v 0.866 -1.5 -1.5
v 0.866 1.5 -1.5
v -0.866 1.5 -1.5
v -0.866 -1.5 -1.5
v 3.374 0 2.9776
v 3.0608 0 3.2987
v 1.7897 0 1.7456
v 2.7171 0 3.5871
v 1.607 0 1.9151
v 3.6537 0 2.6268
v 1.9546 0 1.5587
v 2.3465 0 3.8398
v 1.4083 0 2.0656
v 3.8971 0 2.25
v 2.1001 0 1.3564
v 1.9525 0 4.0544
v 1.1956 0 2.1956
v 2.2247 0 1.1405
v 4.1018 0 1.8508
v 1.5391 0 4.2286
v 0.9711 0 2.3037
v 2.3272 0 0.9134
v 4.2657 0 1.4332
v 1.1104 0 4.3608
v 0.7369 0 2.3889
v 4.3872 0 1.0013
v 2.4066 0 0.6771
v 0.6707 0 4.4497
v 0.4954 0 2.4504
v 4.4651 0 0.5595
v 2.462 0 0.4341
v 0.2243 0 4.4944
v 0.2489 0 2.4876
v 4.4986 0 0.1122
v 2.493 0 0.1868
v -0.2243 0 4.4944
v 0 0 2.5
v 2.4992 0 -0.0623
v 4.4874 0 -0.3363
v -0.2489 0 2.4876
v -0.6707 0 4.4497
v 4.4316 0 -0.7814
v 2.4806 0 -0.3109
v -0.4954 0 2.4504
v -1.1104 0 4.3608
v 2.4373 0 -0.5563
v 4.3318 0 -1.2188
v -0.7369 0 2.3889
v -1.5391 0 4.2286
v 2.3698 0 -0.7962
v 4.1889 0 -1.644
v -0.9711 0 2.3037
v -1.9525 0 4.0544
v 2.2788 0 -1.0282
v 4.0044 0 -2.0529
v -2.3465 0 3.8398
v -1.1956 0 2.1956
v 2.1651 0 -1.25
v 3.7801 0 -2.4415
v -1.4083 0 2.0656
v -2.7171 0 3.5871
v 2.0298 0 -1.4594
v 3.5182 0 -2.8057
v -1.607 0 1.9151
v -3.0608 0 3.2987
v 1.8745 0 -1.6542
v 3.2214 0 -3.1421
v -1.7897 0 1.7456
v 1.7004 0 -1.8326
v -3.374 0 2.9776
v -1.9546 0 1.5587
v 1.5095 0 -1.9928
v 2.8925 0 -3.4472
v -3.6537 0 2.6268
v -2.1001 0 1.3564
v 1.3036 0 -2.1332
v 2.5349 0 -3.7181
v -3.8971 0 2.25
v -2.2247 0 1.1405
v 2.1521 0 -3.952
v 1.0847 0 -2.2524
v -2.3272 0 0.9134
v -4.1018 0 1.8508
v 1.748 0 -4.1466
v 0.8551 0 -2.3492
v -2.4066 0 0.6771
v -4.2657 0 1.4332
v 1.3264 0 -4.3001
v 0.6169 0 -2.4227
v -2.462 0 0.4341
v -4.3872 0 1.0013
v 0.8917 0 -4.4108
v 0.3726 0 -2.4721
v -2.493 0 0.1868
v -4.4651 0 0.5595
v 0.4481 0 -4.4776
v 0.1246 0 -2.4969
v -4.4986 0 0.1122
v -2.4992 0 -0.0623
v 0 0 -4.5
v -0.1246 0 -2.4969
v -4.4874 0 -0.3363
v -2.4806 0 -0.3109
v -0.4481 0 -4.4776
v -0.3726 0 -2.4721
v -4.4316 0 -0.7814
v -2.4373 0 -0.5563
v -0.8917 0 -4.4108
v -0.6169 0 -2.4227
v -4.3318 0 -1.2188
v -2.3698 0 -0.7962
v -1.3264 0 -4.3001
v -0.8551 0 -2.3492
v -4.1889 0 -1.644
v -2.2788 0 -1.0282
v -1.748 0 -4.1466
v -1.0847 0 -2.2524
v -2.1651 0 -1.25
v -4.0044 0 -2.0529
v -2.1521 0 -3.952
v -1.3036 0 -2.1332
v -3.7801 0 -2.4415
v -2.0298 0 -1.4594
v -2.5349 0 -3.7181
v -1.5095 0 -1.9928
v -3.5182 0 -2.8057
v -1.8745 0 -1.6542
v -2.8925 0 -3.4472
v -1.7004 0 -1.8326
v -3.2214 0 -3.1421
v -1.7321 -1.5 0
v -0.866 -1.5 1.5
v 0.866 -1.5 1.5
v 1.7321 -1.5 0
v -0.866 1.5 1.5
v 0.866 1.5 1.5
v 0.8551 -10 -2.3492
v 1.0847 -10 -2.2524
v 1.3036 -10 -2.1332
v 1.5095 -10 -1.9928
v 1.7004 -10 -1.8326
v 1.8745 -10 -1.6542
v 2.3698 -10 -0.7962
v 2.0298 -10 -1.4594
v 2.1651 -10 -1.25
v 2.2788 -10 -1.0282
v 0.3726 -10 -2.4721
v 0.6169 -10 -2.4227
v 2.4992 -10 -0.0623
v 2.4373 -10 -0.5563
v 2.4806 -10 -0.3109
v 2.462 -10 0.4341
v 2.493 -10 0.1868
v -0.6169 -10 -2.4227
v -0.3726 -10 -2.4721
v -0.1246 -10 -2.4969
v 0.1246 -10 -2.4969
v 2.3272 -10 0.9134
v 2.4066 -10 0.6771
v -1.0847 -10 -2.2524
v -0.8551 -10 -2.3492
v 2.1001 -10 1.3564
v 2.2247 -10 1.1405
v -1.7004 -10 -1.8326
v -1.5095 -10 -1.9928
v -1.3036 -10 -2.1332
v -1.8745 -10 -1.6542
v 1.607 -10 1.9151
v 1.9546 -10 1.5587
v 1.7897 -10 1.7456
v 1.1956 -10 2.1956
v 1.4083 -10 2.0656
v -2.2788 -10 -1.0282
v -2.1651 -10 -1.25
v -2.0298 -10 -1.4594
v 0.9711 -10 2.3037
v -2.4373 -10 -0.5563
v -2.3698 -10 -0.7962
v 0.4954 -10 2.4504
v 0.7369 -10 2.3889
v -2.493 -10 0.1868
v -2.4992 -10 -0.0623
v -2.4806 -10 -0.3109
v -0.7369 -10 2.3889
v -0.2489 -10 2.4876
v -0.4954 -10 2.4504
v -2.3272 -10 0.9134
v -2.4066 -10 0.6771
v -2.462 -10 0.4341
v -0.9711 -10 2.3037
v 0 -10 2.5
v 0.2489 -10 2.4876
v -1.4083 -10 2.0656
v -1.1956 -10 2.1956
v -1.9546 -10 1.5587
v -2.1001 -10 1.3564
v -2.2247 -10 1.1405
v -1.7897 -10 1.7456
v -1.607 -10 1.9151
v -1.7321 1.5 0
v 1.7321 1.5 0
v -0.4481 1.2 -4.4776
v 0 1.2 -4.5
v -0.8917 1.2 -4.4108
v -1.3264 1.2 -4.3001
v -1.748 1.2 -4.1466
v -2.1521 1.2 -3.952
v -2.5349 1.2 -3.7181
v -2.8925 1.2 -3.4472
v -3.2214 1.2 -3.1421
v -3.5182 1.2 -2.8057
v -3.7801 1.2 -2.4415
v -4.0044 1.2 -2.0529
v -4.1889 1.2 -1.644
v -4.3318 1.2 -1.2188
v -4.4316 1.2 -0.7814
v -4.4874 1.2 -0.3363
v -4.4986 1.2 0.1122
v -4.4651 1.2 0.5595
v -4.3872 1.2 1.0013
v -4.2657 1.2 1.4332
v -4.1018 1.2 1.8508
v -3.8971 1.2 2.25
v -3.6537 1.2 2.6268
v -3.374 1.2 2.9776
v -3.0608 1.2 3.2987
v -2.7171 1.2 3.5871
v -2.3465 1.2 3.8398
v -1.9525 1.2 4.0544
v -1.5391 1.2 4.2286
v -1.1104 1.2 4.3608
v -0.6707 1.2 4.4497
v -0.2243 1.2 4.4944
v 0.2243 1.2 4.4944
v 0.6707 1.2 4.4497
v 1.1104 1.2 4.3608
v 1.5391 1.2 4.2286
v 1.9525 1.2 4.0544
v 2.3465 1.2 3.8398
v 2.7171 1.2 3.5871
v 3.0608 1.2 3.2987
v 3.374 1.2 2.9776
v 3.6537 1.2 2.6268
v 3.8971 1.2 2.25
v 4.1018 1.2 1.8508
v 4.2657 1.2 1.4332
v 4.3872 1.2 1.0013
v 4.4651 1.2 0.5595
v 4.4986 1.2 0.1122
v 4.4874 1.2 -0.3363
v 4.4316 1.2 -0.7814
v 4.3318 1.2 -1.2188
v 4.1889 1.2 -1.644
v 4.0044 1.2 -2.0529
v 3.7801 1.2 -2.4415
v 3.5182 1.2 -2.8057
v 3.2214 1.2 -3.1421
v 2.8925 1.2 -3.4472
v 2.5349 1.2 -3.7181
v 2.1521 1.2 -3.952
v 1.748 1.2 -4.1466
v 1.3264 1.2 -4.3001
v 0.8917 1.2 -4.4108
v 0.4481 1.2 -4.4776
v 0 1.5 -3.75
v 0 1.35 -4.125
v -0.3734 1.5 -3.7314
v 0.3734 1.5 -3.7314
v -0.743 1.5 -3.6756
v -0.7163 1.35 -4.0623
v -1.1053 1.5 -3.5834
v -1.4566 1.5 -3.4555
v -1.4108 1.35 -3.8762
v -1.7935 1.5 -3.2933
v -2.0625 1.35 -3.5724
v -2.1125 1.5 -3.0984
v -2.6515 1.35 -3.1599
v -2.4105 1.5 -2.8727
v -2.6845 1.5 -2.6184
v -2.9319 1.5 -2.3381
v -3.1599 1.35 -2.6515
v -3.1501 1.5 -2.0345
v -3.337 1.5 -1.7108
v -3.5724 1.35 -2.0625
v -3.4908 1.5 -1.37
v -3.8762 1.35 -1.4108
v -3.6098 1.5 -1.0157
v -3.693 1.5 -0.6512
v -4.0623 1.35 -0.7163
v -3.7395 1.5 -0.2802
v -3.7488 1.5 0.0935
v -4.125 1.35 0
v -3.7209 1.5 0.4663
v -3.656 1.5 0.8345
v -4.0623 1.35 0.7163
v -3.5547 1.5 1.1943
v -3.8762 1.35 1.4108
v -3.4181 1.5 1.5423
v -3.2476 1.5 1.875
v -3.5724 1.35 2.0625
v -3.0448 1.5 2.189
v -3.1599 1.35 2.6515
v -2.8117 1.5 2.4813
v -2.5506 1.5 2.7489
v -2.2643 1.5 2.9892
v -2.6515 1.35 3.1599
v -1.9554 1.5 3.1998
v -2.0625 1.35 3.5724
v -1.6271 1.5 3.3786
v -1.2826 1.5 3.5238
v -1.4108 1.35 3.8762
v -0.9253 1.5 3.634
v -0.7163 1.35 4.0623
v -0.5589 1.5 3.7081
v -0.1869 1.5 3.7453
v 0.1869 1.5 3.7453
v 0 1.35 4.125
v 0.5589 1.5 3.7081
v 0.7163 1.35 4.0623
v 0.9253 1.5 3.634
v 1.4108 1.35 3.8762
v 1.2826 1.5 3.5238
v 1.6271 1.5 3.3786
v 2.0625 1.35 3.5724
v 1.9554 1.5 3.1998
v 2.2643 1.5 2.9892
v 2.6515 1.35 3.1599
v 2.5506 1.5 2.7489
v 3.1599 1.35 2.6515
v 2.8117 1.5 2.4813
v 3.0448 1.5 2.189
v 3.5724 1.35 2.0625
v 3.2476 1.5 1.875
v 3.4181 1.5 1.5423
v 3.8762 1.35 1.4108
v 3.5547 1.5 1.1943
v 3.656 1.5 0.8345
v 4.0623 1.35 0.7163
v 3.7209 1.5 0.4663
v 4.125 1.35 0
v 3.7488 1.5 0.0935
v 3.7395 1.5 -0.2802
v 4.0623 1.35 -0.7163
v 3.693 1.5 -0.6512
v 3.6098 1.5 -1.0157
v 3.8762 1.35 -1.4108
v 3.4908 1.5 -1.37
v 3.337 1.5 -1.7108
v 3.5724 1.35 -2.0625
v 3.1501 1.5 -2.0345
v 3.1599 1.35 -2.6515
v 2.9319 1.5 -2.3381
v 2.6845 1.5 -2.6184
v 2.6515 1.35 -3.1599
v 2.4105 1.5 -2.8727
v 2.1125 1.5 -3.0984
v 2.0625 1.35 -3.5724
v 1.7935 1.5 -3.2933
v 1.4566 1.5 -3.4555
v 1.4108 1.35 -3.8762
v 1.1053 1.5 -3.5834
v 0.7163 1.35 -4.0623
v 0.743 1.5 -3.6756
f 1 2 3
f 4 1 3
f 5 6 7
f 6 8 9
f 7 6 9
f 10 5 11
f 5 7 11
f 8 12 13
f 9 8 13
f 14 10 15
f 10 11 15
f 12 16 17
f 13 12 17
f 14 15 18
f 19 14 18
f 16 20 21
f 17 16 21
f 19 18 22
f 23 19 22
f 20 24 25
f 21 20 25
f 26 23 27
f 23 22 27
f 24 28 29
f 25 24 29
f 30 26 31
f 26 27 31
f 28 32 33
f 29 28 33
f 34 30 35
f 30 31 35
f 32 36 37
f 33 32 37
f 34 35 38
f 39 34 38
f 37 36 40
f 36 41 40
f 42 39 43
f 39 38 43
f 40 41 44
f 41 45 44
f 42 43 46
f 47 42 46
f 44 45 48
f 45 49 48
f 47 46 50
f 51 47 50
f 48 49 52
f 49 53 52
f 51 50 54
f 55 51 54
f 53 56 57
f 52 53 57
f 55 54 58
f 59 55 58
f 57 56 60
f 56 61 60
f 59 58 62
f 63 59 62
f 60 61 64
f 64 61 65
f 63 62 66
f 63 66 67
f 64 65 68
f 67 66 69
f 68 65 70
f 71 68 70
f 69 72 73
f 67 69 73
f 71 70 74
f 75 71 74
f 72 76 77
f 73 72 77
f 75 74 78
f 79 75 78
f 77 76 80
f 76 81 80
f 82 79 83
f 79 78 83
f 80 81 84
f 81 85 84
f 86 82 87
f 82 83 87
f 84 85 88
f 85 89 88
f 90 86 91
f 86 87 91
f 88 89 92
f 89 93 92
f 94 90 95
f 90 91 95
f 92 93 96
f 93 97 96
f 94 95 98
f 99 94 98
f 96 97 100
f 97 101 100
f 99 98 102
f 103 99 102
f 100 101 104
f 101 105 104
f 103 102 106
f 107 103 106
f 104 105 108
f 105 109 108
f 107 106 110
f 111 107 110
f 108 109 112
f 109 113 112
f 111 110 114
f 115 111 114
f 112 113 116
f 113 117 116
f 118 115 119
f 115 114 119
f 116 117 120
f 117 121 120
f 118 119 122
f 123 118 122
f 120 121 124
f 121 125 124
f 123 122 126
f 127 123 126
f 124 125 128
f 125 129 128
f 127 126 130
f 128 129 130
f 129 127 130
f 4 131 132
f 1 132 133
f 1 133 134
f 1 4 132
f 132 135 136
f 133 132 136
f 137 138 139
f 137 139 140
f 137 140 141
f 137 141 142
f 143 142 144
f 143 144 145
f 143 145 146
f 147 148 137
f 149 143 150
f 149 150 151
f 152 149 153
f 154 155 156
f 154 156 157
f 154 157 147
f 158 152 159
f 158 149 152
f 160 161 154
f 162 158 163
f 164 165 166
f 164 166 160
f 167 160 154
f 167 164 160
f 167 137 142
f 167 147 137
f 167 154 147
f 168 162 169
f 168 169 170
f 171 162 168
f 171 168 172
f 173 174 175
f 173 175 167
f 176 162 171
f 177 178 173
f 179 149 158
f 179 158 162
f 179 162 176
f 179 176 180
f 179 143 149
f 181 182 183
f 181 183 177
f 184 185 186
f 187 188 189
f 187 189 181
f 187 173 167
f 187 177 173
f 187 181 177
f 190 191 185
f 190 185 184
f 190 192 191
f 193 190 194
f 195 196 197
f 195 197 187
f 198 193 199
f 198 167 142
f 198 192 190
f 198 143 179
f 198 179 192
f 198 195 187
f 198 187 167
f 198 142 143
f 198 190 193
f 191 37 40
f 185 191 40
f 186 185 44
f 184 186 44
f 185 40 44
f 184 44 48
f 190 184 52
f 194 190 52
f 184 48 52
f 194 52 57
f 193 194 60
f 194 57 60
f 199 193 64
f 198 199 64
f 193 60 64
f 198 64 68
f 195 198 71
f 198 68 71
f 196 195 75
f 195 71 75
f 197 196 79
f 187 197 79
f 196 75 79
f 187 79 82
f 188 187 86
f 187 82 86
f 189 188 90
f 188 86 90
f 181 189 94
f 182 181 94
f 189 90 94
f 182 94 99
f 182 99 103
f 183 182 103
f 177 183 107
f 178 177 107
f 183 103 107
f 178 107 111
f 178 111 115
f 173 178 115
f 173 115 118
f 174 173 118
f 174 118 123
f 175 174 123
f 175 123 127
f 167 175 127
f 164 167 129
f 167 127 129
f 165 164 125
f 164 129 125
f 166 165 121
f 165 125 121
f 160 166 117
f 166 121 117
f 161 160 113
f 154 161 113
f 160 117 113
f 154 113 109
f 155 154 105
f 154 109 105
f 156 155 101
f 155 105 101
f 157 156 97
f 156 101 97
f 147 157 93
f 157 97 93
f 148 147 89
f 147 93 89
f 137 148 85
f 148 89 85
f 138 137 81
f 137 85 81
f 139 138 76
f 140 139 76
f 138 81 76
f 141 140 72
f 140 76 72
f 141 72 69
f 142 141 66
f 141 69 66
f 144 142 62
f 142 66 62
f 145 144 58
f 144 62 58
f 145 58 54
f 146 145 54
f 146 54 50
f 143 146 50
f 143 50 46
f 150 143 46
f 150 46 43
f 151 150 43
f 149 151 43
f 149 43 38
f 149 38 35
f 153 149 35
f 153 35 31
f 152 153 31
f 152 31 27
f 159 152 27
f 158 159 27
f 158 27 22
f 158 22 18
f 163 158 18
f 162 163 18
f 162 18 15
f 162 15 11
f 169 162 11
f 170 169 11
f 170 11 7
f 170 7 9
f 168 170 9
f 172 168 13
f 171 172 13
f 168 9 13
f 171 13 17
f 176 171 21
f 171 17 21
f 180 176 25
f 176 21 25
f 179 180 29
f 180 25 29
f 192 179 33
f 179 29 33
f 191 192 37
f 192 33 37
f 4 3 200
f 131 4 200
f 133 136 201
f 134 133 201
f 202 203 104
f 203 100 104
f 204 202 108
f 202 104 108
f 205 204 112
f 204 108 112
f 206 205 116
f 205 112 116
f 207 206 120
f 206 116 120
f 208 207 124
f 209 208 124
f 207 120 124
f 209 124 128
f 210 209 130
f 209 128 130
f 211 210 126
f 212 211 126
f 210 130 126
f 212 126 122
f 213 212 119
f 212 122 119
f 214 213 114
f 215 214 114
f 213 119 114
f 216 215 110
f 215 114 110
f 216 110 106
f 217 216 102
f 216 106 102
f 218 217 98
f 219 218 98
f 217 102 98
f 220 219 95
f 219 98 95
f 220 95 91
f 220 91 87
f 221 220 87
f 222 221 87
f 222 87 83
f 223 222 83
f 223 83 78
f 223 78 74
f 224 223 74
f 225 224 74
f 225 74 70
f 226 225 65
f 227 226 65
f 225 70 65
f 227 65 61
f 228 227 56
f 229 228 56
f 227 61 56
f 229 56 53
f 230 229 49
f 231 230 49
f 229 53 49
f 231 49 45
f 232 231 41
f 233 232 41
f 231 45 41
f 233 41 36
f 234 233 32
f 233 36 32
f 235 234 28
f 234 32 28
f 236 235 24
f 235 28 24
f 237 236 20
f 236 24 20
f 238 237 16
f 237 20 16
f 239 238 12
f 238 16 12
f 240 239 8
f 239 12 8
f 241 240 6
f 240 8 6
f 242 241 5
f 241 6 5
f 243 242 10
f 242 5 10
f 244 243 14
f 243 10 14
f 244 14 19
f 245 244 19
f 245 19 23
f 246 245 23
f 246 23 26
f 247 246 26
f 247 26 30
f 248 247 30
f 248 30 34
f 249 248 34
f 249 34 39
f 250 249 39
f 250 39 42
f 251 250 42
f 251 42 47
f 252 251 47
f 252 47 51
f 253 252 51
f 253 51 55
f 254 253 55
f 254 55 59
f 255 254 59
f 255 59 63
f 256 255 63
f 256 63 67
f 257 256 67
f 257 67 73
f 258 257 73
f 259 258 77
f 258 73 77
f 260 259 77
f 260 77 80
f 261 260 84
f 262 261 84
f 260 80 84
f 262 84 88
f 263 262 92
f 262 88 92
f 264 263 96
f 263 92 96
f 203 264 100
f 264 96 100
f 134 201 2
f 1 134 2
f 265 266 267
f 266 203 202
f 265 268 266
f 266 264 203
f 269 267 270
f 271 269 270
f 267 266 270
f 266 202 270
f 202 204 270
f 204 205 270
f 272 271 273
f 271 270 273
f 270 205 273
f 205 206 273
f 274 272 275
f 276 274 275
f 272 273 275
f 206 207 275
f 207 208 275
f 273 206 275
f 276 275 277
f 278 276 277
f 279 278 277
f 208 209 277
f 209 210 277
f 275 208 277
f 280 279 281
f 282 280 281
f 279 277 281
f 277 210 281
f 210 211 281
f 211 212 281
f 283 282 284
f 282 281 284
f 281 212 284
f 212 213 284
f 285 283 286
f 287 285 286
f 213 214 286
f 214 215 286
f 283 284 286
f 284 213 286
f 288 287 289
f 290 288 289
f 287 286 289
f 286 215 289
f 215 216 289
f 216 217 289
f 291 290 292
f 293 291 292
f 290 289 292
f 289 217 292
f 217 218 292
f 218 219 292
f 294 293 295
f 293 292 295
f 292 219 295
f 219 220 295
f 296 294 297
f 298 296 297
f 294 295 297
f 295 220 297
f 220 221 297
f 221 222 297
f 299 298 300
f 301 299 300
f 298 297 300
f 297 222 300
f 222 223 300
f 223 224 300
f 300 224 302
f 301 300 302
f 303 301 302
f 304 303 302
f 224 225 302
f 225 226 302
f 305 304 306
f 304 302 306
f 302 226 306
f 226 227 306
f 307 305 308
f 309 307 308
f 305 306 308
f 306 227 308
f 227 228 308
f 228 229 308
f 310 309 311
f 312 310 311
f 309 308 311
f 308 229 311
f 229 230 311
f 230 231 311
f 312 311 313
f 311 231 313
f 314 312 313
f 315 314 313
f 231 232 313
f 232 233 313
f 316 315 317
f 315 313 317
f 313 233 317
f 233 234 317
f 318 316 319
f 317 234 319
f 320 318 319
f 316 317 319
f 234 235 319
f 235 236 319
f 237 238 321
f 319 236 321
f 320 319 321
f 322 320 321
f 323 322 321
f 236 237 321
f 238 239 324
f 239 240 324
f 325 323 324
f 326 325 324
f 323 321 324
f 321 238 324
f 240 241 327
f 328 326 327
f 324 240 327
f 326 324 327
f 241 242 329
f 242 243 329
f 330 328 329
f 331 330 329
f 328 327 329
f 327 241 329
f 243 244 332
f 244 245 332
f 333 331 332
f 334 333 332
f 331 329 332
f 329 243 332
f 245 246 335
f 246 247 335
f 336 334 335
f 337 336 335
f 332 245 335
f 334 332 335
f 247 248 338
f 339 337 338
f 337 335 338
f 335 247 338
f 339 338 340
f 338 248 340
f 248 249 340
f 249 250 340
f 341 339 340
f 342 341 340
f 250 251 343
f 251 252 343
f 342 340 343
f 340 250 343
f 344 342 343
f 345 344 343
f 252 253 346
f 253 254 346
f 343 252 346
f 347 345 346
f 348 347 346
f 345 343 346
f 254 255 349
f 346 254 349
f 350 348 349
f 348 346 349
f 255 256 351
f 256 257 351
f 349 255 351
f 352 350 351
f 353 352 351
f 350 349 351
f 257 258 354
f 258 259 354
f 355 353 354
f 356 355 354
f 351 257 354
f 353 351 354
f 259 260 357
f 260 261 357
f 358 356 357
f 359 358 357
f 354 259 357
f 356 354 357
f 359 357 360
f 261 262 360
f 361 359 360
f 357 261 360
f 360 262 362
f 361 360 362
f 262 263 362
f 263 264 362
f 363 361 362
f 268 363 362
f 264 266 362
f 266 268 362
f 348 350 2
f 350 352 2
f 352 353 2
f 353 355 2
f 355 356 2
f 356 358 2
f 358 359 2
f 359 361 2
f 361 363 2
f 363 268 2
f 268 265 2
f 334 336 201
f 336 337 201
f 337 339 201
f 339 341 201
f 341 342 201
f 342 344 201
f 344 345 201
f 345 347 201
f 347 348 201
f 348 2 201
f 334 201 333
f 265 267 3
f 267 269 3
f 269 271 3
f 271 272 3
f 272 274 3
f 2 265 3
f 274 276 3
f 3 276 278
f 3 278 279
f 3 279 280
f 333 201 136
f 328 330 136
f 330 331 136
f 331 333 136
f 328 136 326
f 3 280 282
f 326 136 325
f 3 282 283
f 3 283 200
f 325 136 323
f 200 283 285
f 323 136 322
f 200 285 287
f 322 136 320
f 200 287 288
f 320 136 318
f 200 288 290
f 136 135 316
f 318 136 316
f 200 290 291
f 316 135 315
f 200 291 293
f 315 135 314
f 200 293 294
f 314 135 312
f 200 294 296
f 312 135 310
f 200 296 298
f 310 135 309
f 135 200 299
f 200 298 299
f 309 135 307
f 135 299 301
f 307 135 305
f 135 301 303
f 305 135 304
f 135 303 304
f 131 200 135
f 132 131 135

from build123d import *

# Parameters (mm, degrees)
SKETCH3_R           = 2.5
BOSS_EXTRUDE1_DEPTH = 10
CUT_EXTRUDE2_DEPTH  = 3


with BuildPart() as part:
    # Sketch1 → Revolve1 (revolve)
    with BuildSketch(Plane.XY, mode=Mode.PRIVATE) as revolve1_sk:
        Polygon((-2.5, 0), (0, 0), (0, 1.5), (-3.75, 1.5), (-4.5, 1.2), (-4.5, 0), align=None)
    revolve(revolve1_sk.sketch.rotate(Axis((0, 0, 0), (0, 1, 0)), 270), axis=Axis((0, 0, 0), (0, 1, 0)))

    # Sketch3 → Boss-Extrude1 (add)
    with BuildSketch(Plane.XZ):
        with Locations(Location((0, 0, 0), (0, 0, 90))):
            Circle(SKETCH3_R)
    extrude(amount=BOSS_EXTRUDE1_DEPTH)

    # Sketch2 → Cut-Extrude2 (cut)
    with BuildSketch(Plane(origin=(0, 1.5, 0), x_dir=(1, 0, 0), z_dir=(0, 1, 0))):
        Polygon((1.732050808, 0), (0.866025404, 1.5), (-0.866025404, 1.5), (-1.732050808, 0), (-0.866025404, -1.5), (0.866025404, -1.5), align=None)
    extrude(amount=-CUT_EXTRUDE2_DEPTH, mode=Mode.SUBTRACT)


solid = part.part
